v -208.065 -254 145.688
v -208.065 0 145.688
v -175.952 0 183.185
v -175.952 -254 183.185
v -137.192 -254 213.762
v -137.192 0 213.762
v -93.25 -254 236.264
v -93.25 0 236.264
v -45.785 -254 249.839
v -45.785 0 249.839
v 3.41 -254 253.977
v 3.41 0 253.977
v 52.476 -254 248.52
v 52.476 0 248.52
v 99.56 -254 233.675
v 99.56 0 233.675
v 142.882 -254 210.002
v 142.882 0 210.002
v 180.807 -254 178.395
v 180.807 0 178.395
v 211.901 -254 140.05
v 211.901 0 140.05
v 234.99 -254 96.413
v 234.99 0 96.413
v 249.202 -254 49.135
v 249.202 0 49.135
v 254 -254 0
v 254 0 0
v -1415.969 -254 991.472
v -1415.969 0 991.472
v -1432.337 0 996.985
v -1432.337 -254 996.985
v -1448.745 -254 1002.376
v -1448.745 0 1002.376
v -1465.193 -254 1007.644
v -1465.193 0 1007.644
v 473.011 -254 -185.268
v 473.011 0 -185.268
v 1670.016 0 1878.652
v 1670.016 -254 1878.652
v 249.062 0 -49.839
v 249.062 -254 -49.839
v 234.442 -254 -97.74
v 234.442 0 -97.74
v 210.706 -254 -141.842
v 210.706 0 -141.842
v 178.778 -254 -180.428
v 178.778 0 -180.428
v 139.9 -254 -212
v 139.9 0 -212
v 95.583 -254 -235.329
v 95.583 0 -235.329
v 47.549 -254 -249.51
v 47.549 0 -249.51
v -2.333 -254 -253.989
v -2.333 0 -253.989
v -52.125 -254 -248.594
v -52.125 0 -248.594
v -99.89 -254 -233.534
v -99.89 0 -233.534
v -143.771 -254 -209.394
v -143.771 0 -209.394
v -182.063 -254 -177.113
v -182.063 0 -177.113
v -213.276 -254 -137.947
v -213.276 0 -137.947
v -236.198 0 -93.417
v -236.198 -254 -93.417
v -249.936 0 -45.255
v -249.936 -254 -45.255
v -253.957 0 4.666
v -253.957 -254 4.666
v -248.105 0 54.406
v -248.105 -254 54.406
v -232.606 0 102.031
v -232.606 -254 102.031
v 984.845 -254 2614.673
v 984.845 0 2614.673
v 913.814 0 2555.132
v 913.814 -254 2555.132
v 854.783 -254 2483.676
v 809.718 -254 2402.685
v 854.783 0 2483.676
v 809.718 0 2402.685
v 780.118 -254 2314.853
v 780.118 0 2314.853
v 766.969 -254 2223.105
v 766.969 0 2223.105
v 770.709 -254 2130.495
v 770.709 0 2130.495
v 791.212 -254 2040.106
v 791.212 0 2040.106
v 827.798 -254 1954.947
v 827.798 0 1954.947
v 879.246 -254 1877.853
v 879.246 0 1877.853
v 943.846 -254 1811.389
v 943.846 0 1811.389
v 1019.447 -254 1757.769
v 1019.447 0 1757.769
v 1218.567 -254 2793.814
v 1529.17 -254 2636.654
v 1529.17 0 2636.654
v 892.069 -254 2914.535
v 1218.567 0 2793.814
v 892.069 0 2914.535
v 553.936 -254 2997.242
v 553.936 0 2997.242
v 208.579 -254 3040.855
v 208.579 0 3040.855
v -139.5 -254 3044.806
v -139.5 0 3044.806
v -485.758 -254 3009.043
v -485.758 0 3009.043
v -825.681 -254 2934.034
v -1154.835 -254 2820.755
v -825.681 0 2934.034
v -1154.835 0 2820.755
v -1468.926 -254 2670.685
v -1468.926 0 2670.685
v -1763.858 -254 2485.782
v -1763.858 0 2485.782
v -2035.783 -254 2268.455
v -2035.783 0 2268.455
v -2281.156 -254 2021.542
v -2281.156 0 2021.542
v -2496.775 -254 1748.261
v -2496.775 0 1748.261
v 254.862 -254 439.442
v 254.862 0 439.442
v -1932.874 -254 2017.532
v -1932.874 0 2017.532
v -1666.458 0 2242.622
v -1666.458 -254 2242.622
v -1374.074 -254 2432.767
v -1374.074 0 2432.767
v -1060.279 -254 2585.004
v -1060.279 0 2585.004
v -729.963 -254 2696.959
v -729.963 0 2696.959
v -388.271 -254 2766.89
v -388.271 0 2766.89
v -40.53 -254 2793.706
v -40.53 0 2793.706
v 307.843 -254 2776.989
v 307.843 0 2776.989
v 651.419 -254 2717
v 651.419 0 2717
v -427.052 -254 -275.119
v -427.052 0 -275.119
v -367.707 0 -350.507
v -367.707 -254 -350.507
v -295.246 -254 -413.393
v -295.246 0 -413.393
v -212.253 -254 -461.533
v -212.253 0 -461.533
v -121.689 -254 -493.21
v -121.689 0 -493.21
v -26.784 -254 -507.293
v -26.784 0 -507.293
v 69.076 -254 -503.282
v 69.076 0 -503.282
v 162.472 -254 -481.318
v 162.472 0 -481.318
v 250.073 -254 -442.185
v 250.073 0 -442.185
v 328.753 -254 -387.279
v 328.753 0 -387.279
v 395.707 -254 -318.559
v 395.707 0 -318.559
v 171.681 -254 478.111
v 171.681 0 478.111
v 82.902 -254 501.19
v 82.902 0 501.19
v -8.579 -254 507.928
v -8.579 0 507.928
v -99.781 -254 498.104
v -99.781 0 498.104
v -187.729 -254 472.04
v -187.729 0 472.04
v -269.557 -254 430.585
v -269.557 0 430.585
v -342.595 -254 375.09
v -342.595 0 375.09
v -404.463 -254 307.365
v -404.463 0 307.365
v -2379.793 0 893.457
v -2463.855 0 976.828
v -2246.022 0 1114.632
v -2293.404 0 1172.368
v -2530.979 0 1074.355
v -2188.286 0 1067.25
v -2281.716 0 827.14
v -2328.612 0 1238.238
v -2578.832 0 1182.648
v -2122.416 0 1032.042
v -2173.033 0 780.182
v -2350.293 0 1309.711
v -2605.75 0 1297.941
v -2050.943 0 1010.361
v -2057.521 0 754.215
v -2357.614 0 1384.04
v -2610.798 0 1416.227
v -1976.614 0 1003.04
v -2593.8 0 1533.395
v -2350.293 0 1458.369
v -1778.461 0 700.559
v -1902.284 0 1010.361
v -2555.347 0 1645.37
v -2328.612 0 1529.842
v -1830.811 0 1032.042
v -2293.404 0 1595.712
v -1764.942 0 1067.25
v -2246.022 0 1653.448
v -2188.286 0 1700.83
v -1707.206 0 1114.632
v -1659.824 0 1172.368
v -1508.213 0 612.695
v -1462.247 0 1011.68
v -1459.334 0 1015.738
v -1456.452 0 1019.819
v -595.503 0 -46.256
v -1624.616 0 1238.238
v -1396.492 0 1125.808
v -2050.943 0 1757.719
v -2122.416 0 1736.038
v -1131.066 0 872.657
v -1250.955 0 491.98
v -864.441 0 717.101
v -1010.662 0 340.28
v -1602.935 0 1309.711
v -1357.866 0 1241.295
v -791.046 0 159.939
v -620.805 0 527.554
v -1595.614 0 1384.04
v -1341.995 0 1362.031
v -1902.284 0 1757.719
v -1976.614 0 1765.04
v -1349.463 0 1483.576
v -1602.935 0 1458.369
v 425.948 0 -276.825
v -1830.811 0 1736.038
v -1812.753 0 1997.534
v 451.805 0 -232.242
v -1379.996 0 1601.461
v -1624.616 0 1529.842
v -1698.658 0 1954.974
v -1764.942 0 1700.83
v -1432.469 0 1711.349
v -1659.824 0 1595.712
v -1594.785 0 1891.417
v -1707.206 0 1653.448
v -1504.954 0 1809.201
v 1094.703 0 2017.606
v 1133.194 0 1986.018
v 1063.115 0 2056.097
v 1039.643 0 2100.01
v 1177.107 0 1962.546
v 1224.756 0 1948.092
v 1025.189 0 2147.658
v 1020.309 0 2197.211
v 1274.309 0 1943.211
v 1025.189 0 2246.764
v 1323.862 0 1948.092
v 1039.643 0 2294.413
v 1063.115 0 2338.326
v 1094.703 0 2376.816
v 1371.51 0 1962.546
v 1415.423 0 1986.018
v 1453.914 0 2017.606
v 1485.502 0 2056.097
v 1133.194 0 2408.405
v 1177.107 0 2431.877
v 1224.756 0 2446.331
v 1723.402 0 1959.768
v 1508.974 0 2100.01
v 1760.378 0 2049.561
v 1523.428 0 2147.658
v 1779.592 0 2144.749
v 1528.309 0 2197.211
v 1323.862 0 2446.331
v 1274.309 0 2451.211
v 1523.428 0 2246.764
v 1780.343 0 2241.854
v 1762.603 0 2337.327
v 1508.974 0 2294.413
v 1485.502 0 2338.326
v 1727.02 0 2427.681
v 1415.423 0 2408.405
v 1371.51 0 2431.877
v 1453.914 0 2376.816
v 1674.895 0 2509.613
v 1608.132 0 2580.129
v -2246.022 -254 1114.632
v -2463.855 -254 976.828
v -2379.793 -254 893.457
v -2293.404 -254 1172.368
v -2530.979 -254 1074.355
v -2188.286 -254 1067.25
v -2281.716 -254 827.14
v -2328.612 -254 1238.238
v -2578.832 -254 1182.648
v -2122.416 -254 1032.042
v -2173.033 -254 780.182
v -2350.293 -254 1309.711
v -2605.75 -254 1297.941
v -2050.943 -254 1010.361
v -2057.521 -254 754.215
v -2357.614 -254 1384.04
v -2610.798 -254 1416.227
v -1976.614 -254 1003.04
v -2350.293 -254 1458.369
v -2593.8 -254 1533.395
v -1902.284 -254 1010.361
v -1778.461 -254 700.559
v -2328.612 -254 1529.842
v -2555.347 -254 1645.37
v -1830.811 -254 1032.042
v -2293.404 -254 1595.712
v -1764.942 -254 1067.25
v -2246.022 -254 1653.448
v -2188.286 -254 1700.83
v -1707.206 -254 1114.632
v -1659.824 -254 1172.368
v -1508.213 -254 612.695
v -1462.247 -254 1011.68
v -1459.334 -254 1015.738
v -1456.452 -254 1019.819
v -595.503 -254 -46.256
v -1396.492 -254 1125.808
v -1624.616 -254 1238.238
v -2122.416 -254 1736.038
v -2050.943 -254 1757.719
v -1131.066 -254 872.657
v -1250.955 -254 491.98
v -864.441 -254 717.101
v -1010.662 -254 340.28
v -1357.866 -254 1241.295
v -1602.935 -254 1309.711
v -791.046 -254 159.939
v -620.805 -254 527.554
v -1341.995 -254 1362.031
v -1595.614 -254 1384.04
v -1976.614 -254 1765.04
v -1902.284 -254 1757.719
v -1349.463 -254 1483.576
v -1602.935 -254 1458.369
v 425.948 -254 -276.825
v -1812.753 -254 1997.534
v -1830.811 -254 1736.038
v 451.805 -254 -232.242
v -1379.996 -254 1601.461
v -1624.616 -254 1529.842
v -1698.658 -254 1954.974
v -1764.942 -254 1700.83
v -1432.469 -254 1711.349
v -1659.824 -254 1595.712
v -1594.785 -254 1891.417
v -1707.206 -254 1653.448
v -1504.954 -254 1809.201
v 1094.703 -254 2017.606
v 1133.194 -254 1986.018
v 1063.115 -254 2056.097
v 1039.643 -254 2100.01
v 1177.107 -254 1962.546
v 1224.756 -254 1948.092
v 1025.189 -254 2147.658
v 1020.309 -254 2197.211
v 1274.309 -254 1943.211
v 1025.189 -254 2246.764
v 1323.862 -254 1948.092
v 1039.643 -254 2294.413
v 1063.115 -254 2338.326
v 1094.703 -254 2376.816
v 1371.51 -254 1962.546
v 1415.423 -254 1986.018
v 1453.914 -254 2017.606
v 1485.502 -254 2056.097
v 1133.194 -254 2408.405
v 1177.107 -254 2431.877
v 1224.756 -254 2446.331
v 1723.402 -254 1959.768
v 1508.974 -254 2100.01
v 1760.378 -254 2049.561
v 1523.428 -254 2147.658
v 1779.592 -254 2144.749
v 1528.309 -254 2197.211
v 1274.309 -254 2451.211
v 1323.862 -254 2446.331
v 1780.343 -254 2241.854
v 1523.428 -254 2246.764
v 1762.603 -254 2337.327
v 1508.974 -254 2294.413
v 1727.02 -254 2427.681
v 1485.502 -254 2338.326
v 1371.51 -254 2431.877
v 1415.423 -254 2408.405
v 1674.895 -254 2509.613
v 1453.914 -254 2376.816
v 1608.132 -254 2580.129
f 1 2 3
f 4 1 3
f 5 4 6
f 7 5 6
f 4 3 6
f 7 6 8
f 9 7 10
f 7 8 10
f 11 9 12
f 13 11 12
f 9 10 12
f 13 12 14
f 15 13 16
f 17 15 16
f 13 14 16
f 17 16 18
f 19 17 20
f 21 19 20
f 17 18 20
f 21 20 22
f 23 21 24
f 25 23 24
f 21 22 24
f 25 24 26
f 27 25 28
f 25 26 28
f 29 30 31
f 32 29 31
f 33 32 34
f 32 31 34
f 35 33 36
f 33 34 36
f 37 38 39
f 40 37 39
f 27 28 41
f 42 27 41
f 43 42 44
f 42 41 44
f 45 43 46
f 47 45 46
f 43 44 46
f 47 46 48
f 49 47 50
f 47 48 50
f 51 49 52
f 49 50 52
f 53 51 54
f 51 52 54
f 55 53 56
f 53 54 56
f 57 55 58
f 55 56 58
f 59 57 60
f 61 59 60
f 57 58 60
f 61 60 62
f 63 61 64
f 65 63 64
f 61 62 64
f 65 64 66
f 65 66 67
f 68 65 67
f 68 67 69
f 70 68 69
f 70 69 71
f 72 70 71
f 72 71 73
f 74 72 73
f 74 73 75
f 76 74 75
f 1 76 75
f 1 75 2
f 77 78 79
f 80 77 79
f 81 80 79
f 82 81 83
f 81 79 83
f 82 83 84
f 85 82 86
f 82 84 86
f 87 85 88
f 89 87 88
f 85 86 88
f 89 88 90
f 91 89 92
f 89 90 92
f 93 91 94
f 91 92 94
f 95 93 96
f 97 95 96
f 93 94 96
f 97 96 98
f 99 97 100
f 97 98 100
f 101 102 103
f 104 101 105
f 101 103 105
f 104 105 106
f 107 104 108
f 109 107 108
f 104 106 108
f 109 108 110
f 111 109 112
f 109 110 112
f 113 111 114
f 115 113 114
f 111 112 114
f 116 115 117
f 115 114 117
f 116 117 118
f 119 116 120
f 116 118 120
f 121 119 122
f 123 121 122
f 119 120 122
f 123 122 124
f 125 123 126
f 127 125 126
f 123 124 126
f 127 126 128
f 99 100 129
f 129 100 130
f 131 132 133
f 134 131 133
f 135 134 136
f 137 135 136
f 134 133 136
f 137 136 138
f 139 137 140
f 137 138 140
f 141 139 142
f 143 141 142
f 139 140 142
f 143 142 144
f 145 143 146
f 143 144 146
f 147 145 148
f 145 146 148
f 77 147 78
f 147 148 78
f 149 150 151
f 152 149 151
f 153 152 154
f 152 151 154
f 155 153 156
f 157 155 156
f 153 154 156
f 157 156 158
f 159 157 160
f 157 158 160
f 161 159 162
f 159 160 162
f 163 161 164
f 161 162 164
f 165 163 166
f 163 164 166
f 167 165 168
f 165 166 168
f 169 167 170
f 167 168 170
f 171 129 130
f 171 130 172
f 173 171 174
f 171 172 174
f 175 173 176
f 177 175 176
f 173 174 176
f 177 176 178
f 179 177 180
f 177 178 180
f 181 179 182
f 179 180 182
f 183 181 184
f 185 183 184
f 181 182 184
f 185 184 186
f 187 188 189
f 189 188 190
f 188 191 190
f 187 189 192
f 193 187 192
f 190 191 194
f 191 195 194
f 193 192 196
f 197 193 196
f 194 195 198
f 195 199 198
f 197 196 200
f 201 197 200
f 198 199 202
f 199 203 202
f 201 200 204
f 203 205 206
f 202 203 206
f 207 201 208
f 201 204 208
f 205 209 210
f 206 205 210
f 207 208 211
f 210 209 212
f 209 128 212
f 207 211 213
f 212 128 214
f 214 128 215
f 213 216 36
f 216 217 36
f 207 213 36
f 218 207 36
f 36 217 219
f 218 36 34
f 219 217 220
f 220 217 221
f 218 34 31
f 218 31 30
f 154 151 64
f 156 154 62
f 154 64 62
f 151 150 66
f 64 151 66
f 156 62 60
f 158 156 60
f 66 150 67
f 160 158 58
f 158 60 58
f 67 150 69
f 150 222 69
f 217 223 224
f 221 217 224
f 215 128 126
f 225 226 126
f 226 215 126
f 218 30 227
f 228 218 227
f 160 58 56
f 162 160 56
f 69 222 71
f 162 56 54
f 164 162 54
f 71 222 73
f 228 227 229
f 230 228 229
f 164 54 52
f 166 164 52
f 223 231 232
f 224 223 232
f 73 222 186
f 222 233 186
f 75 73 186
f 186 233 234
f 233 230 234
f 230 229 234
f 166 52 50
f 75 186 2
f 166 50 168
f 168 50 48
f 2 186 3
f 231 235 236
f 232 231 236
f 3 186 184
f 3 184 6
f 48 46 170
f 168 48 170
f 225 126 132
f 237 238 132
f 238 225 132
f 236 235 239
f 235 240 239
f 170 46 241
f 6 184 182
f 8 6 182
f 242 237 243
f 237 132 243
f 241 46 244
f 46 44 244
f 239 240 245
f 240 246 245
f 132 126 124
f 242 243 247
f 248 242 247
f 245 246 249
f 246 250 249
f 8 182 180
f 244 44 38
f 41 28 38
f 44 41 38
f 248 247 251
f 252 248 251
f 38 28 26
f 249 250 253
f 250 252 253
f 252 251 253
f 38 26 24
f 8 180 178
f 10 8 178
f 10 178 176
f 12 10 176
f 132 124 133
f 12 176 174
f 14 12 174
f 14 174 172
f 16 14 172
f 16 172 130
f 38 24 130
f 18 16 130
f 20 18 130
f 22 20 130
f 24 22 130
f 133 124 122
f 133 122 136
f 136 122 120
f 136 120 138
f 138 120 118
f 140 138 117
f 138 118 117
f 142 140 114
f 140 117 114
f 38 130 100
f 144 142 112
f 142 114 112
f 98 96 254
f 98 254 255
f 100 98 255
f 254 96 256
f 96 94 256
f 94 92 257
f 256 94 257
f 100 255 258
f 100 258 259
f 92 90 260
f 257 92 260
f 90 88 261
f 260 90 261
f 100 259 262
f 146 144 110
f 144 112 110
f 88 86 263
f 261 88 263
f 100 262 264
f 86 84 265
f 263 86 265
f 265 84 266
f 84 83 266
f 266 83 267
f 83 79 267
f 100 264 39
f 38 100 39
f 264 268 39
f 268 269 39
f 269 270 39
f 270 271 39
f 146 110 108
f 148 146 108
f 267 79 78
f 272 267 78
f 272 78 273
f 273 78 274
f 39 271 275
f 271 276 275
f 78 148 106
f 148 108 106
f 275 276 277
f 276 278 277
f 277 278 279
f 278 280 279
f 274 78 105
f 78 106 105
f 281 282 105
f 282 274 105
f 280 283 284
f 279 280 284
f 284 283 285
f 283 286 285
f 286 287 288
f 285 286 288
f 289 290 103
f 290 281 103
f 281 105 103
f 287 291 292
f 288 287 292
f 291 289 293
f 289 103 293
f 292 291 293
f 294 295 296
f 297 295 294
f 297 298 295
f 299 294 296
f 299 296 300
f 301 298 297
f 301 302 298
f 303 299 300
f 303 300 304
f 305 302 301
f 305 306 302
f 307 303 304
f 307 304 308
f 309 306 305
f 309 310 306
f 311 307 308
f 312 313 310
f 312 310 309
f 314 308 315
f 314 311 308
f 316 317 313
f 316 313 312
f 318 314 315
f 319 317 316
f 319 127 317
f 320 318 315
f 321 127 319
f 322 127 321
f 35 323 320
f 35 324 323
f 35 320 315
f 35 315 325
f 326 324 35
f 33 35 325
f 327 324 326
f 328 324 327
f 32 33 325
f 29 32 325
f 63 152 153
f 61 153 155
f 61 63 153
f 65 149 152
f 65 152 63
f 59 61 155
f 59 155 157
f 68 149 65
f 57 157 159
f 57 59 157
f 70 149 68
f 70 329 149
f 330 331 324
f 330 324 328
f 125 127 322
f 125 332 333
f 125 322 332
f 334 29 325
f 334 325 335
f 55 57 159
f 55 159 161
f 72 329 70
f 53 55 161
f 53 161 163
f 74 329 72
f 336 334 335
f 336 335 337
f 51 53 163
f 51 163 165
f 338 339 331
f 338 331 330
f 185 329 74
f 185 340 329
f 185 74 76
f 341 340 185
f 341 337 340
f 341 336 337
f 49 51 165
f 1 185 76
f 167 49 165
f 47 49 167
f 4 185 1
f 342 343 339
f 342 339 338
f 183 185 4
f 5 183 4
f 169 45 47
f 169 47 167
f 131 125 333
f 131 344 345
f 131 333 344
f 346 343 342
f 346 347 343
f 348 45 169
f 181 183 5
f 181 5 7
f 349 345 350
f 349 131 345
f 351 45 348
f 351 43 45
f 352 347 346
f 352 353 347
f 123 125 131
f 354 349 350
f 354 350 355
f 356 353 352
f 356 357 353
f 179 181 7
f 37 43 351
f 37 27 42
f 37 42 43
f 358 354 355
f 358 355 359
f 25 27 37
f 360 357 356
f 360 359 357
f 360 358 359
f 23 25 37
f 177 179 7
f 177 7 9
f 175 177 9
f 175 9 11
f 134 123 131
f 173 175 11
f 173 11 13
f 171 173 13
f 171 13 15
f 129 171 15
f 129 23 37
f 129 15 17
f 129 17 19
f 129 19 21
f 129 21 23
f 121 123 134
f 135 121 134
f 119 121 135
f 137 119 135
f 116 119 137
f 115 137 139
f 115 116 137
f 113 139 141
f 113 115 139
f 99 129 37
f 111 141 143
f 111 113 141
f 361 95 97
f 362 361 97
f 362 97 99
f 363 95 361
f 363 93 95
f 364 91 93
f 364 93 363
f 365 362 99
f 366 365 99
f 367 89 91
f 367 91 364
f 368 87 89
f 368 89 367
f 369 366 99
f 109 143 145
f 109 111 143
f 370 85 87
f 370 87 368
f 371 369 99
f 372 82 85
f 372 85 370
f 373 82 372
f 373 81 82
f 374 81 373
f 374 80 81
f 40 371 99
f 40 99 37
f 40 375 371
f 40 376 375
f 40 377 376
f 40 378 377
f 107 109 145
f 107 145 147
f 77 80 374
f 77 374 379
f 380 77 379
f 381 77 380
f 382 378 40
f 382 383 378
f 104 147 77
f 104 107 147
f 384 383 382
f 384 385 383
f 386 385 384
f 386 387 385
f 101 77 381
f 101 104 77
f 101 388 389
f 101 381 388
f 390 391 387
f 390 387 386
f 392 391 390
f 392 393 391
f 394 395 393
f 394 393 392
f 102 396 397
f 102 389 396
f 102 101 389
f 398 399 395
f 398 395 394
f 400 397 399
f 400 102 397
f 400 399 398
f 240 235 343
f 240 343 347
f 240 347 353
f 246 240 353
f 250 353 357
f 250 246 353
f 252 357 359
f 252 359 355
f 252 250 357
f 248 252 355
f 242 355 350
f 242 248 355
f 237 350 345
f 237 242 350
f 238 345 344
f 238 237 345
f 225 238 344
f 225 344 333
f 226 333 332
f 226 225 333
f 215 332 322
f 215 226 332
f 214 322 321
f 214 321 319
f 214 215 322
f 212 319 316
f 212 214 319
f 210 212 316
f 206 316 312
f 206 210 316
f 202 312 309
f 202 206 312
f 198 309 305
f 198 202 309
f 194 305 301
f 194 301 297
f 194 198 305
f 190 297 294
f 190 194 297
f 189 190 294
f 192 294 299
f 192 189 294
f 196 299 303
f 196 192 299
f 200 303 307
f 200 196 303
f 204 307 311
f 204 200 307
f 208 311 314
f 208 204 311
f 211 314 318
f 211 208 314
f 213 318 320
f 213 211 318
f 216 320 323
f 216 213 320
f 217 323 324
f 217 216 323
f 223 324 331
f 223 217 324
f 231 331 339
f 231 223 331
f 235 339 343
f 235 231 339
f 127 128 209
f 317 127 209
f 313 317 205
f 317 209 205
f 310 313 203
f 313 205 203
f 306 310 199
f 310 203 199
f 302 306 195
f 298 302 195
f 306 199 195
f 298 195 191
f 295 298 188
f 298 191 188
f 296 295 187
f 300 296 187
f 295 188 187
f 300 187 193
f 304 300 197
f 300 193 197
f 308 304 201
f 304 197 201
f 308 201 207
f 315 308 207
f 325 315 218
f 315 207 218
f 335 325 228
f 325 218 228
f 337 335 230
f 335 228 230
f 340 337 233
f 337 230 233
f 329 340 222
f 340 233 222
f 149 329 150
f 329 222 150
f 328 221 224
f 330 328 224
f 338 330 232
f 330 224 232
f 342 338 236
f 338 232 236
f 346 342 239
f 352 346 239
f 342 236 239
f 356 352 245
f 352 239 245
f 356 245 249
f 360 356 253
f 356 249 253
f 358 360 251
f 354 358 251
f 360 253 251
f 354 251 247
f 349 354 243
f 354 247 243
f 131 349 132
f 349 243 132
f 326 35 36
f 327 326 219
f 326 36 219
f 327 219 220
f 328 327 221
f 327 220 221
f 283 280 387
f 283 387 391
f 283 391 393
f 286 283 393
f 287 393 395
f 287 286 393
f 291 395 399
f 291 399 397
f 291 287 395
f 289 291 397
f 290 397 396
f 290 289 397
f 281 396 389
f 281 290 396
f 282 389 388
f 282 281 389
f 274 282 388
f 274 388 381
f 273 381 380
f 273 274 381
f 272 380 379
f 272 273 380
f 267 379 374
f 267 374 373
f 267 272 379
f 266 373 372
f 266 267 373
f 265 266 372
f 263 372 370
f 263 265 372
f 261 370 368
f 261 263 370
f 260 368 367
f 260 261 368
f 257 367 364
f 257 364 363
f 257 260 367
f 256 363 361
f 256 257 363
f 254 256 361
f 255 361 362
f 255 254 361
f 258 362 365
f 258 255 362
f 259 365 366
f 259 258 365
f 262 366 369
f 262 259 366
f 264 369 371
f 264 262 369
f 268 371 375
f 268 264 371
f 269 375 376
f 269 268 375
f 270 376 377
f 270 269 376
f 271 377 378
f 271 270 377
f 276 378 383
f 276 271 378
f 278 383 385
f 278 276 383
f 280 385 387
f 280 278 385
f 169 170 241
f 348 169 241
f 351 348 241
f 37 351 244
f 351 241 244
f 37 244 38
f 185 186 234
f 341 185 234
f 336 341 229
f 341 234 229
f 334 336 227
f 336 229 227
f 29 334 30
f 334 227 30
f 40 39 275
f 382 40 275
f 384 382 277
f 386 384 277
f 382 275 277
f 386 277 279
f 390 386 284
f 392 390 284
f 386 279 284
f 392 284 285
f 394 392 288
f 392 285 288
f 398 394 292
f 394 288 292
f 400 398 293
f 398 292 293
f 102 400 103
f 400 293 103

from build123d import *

# Parameters (mm, degrees)
F0_R     = 381
F0_R_2   = 254
F1_DEPTH = 254


with BuildPart() as f1:
    # F0 (on Front) → F1 (new body)
    with BuildSketch(Plane.XZ):
        with BuildLine():
            Line((473.011244, -185.268353), (395.707135, -318.559042))
            ThreePointArc((395.707135, -318.559042), (439.442269, -254.861712), (473.011244, -185.268353))
        make_face()
        with BuildLine():
            ThreePointArc((-2057.521233, 754.215362), (-1128.449023, 419.867707), (-427.052308, -275.11875))
            ThreePointArc((-427.052308, -275.11875), (-26.784225, -507.293411), (395.707135, -318.559042))
            Line((395.707135, -318.559042), (473.011244, -185.268353))
            Line((473.011244, -185.268353), (1670.015697, 1878.652302))
            ThreePointArc((1670.015697, 1878.652302), (1773.759714, 2290.015152), (1529.170274, 2636.653613))
            ThreePointArc((1529.170274, 2636.653613), (-656.791674, 2976.395252), (-2496.775431, 1748.260978))
            ThreePointArc((-2496.775431, 1748.260978), (-2557.434532, 1127.383803), (-2057.521233, 754.215362))
        make_face()
        with BuildLine():
            ThreePointArc((-208.064619, 145.688415), (76.379273, 242.244105), (254, 0))
            ThreePointArc((254, 0), (-76.379273, -242.244105), (-208.064619, 145.688415))
        make_face(mode=Mode.SUBTRACT)
        with Locations((-1976.613883, 1384.039941)):
            Circle(F0_R, mode=Mode.SUBTRACT)
        with BuildLine():
            ThreePointArc((-1932.873975, 2017.531709), (-560.209334, 2737.261679), (984.84457, 2614.673435))
            ThreePointArc((984.84457, 2614.673435), (766.722226, 2176.714723), (1019.44685, 1757.769075))
            Line((1019.44685, 1757.769075), (254.861712, 439.442269))
            ThreePointArc((254.861712, 439.442269), (-99.781003, 498.104157), (-404.463359, 307.365241))
            ThreePointArc((-404.463359, 307.365241), (-864.441016, 717.100965), (-1415.969091, 991.472231))
            ThreePointArc((-1415.969091, 991.472231), (-1440.535888, 999.695628), (-1465.1929, 1007.644433))
            ThreePointArc((-1465.1929, 1007.644433), (-1460.786699, 1013.705881), (-1456.452335, 1019.818904))
            ThreePointArc((-1456.452335, 1019.818904), (-1403.592135, 1657.665737), (-1932.873975, 2017.531709))
        make_face(mode=Mode.SUBTRACT)
        with Locations((1274.308562, 2197.211344)):
            Circle(F0_R_2, mode=Mode.SUBTRACT)
    extrude(amount=F1_DEPTH)


solid = f1.part
